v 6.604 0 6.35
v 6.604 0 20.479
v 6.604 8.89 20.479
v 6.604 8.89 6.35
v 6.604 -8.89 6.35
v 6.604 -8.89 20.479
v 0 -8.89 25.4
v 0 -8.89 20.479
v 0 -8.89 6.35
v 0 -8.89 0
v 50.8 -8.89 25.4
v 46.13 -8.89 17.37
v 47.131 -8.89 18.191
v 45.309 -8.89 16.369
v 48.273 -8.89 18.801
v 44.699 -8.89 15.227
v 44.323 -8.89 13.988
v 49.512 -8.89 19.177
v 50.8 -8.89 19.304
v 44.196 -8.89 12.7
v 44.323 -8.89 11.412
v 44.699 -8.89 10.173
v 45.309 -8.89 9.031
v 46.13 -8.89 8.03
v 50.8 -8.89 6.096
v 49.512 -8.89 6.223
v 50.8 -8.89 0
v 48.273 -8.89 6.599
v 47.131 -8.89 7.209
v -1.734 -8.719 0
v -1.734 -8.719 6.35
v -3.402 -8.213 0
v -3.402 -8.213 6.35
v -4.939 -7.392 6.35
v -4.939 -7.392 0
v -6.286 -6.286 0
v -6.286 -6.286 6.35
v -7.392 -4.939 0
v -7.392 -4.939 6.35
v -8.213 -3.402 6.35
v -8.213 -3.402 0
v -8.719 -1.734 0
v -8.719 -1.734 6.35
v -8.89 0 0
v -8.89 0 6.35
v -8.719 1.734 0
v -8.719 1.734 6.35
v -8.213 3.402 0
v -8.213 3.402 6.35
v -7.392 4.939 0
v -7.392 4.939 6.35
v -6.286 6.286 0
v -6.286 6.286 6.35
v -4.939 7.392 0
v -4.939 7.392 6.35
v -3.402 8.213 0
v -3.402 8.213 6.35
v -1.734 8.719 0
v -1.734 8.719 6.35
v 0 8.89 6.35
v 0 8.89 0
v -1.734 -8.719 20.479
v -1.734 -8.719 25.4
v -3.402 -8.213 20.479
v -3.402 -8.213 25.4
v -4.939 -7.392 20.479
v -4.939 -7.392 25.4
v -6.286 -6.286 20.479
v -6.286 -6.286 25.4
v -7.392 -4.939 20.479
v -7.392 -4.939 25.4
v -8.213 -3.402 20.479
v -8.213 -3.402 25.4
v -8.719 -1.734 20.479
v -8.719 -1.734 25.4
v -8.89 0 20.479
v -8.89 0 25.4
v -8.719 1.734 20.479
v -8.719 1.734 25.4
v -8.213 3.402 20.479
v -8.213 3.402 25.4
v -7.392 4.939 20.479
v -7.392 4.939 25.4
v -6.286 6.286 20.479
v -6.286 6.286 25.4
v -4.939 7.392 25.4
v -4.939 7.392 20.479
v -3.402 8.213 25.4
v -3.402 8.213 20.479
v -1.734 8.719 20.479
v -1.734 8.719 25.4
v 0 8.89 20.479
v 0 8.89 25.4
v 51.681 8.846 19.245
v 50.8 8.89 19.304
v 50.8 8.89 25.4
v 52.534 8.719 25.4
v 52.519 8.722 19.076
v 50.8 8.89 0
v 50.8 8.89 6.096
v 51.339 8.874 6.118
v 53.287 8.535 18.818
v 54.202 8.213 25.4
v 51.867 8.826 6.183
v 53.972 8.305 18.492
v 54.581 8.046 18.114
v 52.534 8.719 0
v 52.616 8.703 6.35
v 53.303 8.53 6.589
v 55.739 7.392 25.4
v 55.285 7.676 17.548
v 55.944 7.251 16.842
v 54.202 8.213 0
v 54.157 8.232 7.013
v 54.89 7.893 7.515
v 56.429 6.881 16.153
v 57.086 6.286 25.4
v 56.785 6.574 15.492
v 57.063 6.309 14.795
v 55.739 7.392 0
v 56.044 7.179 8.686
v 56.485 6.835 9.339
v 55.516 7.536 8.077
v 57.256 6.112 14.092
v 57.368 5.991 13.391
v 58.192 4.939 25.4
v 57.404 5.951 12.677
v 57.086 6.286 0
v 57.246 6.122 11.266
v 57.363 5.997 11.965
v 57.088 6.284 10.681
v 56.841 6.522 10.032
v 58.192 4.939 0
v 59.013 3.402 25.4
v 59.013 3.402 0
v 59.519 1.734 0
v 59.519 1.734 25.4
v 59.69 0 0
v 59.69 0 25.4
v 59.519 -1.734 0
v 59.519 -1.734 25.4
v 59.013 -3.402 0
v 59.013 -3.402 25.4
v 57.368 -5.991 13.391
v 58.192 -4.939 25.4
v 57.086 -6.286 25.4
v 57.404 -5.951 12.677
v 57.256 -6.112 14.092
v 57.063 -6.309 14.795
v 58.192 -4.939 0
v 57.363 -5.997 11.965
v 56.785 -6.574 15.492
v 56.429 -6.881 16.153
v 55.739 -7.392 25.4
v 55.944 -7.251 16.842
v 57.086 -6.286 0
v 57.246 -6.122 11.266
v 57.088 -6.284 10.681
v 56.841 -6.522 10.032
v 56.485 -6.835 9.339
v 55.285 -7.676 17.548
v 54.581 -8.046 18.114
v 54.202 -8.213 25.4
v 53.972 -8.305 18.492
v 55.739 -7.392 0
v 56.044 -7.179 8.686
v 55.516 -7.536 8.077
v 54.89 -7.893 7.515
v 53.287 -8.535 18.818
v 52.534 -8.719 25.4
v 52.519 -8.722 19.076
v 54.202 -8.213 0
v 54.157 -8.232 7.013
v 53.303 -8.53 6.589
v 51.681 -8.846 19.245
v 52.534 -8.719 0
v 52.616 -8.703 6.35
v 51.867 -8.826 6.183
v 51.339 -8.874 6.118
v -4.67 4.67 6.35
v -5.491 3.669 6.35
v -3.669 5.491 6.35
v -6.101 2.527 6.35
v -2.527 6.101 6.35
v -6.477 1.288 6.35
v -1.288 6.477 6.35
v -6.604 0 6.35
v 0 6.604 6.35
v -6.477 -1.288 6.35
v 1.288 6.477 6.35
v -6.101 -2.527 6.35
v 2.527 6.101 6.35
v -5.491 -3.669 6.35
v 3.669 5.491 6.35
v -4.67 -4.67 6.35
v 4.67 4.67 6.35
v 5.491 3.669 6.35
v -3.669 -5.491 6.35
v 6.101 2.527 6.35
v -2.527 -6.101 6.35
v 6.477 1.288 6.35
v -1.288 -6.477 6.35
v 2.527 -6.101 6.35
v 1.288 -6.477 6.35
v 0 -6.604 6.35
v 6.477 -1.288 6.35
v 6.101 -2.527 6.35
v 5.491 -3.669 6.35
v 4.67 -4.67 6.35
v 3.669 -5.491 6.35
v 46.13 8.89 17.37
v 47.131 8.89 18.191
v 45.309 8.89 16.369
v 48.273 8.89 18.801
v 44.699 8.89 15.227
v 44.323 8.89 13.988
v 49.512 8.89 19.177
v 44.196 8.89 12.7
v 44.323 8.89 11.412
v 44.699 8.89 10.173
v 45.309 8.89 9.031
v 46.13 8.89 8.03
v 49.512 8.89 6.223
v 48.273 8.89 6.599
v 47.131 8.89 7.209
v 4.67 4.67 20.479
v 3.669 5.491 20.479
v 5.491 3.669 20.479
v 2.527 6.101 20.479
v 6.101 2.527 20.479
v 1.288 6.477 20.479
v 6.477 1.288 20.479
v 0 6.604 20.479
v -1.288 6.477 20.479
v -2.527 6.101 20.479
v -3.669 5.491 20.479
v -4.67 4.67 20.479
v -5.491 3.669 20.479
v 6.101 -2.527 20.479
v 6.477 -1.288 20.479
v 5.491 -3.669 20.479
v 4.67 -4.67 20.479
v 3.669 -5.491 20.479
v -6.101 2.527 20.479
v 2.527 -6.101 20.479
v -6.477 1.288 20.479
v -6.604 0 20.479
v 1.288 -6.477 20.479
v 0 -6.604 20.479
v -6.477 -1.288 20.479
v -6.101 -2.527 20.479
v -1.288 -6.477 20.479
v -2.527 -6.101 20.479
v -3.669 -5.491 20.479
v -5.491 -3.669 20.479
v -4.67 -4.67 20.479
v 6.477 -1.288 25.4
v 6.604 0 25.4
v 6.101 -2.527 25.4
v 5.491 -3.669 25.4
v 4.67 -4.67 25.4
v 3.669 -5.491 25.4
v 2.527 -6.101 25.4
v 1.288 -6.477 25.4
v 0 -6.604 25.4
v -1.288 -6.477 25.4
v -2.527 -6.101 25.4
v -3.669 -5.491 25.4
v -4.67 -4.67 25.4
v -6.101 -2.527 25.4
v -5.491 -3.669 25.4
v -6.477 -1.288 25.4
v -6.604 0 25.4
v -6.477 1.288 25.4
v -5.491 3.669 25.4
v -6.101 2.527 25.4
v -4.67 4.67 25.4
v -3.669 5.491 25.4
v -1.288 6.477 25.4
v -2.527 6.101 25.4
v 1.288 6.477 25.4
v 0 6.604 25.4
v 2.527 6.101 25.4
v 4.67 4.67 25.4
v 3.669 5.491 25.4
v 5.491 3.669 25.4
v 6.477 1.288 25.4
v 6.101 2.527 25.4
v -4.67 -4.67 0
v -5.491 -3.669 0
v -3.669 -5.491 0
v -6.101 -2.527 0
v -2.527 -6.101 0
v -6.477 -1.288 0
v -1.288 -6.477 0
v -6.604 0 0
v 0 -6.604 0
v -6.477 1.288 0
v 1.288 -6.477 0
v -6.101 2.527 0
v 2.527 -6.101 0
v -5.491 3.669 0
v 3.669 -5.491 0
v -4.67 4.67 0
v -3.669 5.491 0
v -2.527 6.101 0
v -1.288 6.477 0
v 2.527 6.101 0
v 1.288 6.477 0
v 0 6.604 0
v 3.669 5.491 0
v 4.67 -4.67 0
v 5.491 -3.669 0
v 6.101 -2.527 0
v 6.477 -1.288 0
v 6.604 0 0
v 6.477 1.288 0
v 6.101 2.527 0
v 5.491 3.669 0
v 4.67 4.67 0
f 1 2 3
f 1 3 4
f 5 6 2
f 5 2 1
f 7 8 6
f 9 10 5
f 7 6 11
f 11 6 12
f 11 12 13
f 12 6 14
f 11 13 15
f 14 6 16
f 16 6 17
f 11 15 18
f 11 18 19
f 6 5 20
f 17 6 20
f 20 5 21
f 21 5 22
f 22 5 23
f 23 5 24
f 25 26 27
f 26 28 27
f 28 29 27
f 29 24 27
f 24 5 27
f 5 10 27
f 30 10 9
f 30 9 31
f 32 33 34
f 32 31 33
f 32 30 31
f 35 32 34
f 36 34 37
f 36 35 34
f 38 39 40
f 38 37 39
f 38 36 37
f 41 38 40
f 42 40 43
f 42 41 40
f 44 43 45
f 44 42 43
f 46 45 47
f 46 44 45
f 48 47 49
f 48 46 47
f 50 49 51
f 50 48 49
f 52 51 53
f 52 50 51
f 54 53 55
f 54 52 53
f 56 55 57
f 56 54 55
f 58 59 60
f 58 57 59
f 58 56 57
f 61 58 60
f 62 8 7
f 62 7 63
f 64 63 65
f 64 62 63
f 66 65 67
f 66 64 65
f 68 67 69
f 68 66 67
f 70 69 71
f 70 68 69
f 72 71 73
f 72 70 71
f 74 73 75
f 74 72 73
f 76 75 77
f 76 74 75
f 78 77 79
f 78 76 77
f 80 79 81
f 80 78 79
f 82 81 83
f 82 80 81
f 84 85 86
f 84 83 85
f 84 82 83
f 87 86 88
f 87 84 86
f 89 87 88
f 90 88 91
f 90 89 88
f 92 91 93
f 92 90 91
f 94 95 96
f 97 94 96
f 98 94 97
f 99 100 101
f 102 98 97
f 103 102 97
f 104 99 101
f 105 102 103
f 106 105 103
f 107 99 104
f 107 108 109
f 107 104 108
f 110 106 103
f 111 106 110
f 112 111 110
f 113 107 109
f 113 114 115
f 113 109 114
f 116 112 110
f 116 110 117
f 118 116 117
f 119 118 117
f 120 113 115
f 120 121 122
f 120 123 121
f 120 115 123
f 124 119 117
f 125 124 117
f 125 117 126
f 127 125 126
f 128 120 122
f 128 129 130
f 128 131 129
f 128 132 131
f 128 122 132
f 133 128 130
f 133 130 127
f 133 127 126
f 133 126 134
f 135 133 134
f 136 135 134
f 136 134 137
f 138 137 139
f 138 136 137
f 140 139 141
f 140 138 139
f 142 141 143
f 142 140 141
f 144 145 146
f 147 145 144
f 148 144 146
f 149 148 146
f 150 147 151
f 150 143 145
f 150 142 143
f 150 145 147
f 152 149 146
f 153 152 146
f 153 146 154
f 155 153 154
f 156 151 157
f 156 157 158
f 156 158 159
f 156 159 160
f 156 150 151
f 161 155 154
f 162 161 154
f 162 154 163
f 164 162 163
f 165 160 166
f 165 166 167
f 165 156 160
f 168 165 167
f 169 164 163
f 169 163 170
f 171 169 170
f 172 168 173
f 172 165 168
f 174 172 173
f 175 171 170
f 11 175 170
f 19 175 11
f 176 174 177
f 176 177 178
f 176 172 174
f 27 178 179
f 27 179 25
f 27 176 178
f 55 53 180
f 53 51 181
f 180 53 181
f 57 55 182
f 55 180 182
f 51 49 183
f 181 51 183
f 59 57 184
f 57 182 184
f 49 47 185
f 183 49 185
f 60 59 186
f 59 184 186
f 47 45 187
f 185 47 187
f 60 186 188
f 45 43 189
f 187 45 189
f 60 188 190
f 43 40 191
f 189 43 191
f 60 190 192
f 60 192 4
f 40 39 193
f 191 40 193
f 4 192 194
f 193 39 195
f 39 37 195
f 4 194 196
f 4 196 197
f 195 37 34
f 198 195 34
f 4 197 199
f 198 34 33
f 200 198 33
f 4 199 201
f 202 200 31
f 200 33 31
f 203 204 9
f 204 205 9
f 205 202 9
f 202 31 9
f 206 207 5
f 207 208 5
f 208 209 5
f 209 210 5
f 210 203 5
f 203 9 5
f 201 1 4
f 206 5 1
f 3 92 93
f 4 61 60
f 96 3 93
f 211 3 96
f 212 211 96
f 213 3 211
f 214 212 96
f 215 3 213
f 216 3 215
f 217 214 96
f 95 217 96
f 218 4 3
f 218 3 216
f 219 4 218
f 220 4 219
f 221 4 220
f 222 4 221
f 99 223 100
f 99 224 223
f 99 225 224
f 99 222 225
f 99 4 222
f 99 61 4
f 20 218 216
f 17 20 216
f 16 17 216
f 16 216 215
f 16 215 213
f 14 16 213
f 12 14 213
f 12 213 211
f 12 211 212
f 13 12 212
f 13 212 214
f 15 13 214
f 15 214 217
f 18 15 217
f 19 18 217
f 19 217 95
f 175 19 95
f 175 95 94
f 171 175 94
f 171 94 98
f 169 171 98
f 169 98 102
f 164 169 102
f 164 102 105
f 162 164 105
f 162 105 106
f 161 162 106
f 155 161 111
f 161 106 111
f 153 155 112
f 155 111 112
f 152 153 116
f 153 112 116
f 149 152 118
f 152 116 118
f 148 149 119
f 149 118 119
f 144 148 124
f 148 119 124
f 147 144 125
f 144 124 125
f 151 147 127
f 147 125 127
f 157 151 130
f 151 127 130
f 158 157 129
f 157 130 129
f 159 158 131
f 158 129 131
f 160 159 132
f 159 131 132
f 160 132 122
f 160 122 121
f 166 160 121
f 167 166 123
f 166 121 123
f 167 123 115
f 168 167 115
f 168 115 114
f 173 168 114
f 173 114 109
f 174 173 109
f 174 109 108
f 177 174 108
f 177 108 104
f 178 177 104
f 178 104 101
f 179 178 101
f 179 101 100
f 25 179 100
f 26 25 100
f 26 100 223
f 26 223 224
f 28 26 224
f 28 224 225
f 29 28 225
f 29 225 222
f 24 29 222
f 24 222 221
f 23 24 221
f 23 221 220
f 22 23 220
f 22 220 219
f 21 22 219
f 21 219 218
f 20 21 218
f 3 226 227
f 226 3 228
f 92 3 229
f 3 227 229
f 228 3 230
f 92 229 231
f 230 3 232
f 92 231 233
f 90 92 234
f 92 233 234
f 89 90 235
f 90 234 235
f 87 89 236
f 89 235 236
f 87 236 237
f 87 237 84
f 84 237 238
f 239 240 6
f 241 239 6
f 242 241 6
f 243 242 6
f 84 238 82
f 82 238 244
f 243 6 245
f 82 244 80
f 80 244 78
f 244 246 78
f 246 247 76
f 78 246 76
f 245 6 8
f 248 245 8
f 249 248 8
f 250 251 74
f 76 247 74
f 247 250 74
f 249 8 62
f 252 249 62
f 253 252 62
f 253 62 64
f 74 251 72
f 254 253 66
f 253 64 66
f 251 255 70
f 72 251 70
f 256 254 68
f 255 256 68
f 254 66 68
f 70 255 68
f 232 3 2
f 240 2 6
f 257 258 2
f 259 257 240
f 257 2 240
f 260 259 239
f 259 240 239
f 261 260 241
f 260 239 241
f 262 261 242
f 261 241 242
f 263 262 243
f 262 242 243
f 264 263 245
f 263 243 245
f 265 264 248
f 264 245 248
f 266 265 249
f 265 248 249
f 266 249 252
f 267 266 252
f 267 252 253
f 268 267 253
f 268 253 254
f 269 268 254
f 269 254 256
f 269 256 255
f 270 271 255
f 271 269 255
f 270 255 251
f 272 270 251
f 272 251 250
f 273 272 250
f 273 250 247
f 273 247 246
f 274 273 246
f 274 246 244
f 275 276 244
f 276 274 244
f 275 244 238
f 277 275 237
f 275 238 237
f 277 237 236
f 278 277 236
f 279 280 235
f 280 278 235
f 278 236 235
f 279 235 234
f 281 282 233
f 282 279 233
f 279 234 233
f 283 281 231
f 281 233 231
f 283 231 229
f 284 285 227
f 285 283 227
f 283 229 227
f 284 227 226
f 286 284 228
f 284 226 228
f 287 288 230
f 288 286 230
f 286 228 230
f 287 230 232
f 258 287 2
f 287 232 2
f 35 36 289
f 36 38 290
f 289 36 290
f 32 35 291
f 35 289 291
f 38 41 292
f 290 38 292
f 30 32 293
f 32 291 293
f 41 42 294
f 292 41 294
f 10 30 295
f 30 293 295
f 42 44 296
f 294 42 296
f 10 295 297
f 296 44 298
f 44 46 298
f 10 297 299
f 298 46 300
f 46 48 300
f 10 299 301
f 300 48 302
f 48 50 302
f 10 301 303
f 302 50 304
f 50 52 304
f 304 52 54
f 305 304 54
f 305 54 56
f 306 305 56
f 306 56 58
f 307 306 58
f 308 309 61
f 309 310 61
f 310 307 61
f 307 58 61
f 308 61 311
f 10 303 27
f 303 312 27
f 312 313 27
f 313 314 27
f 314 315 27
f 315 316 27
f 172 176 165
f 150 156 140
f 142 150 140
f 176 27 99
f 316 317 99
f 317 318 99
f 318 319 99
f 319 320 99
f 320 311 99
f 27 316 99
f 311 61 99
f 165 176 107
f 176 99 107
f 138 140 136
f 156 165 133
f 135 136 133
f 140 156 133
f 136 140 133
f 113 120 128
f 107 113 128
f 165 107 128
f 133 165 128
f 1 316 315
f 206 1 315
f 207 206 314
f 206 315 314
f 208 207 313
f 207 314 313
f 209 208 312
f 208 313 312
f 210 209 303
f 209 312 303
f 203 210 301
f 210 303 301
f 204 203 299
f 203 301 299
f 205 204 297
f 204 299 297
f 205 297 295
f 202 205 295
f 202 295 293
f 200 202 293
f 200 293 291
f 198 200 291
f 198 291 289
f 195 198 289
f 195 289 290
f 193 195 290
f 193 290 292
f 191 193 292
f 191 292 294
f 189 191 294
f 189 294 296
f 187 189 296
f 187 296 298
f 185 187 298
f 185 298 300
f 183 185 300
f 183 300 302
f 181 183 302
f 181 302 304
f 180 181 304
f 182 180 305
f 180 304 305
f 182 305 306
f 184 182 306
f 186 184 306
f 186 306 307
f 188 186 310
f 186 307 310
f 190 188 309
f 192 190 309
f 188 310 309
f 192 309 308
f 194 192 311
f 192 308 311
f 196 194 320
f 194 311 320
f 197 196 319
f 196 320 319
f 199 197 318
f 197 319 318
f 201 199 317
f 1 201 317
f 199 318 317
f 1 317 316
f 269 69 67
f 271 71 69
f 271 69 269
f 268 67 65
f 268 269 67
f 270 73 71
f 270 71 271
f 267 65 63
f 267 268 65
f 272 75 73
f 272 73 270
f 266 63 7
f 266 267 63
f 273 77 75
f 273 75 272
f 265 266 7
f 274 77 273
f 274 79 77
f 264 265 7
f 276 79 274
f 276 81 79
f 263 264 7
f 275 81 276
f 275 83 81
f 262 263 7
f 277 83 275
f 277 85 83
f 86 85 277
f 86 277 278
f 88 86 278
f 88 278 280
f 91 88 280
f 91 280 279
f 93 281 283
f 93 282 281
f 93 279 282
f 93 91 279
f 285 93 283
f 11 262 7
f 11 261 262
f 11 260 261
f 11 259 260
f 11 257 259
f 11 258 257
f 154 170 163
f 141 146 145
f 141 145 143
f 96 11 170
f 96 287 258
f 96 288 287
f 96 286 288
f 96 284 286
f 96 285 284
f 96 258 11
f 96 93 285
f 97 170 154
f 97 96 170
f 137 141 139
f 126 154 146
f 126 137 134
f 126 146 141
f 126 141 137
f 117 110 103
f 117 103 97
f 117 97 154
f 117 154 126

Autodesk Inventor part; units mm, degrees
ref_plane "YZ Plane" through (0, 0, 0) normal (1, 0, 0) x (0, 1, 0)
ref_plane "XZ Plane" through (0, 0, 0) normal (0, 1, 0) x (-1, 0, 0)
ref_plane "XY Plane" through (0, 0, 0) normal (0, 0, 1) x (1, 0, 0)
sketch "Sketch1" plane through (0, 0, 0) normal (0, 0, 1) x (1, 0, 0)
  circle A0 centre (0, 0) radius 6.604
  arc A1 (0, 8.89) -> (0, -8.89) centre (0, 0) ccw
  line L0 (0, 8.89) -> (50.8, 8.89)
  arc A2 (50.8, -8.89) -> (50.8, 8.89) centre (50.8, 0) ccw
  line L1 (0, -8.89) -> (50.8, -8.89)
  dimension "d0" = 13.208
  dimension "d1" = 17.78
  dimension "d2" = 50.8
extrude "Extrusion1" add sketch "Sketch1" along normal blind 25.4
sketch "Sketch2" plane through (0, 0, 0) normal (0, 1, 0) x (-1, 0, 0)
  line L0 (0, 0) -> (0, 25.4) projected
  line L1 (0, 0) -> (0, 25.4)
  line L2 (8.89, 0) -> (0, 0) projected
  line L3 (0, 0) -> (0, 12.7)
  line L4 (0, 12.7) -> (0, 25.4)
  line L5 (8.89, 0) -> (8.89, 25.4) projected
  line L6 (0, 6.35) -> (8.89, 6.35)
  line L7 (8.89, 6.35) -> (8.89, 20.4788)
  line L8 (8.89, 20.4788) -> (0, 20.4788)
  line L9 (0, 20.4788) -> (0, 6.35)
  line L10 (-6.604, 25.4) -> (-6.604, 0) projected
  line L11 (0, 6.35) -> (-6.604, 6.35)
  line L12 (-6.604, 6.35) -> (-6.604, 20.4788)
  line L13 (-6.604, 20.4788) -> (0, 20.4788)
  line L14 (0, 20.4788) -> (0, 6.35)
extrude "Extrusion2" cut sketch "Sketch2" along normal mid plane 25.4 contours L11 L10 L13 L0 | L0 L8 L5 L6
sketch "Sketch3" plane through (0, 0, 0) normal (0, 1, 0) x (-1, 0, 0)
  line L0 (-50.8, 0) -> (-50.8, 25.4) projected
  circle A0 centre (-50.8, 12.7) radius 6.604
  point P0 (0, 0)
  dimension "d8" = 13.208
extrude "Extrusion3" cut sketch "Sketch3" along normal mid plane 25.4
properties part number "uperlegV1"
